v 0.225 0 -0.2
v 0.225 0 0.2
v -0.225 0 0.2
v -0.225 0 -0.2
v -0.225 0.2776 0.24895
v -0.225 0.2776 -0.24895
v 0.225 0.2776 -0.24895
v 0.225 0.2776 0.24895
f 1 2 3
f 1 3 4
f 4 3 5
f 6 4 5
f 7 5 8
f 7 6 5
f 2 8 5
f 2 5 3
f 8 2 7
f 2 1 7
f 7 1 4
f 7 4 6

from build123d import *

# Parameters (mm, degrees)
SKETCH_TL_CUTTING_R    = 0.997000038
TL_CUTTING_DEPTH       = 29.999999944
SKETCH_TDF_CUTTING_W   = 2.014000036
SKETCH_TDF_CUTTING_H   = 2.014000036
TDF_CUTTING_DEPTH      = 31.033115303
VW_VR_GRINDING_DEPTH   = 1.007000018
VW_VR_GRINDING_2_DEPTH = 1.007000018
ISA_GRINDING_DEPTH     = 1.007000018
SKETCH_PRE_FRX_BRX_W   = 0.762
SKETCH_PRE_FRX_BRX_H   = 0.990000052
SKETCH_PRE_FRX_BRX_W_2 = 0.79199994
PRE_FRX_BRX_DEPTH      = 1.007000018
FA_BA_GRINDING_DEPTH   = 1.007000018


with BuildPart() as part:
    # sketch_TL_cutting → TL_cutting (new body)
    with BuildSketch(Plane(origin=(0, 0, 0), x_dir=(1, 0, 0), z_dir=(0, 1, 0))):
        with Locations(Location((0, 0, 0), (0, 0, 270))):
            Circle(SKETCH_TL_CUTTING_R)
    extrude(amount=TL_CUTTING_DEPTH)

    # sketch_TDF_cutting → TDF_cutting (cut, through all)
    with BuildSketch(Plane(origin=(0, 0, 0), x_dir=(1, 0, 0), z_dir=(0, 1, 0))):
        with Locations((-1.610000082, 0)):
            Rectangle(SKETCH_TDF_CUTTING_W, SKETCH_TDF_CUTTING_H)
    extrude(amount=TDF_CUTTING_DEPTH, mode=Mode.SUBTRACT)


with BuildPart() as body_2:
    # sketch_VW_VR_grinding → VW_VR_grinding (new, symmetric)
    with BuildSketch(Plane(origin=(0, 0, 0), x_dir=(0, 0, -1), z_dir=(1, 0, 0))):
        with BuildLine():
            Line((-0.992000048, -0.00999998), (-0.992000048, 0.978888966))
            ThreePointArc((-0.992000048, 0.978888966), (-0.992048375, 0.979995844), (-0.99219299, 0.981094298))
            Line((-0.99219299, 0.981094298), (-1.016999998, 1.121781834))
            Line((-1.016999998, 1.121781834), (-1.007000018, -0.00999998))
            Line((-1.007000018, -0.00999998), (-0.992000048, -0.00999998))
        make_face()
    extrude(amount=VW_VR_GRINDING_DEPTH, both=True)


with BuildPart() as body_3:
    # sketch_VW_VR_grinding → VW_VR_grinding 2 (new, symmetric)
    with BuildSketch(Plane(origin=(0, 0, 0), x_dir=(0, 0, -1), z_dir=(1, 0, 0))):
        with BuildLine():
            Line((0.992000048, -0.00999998), (0.992000048, 0.978888966))
            ThreePointArc((0.992000048, 0.978888966), (0.992048375, 0.979995844), (0.99219299, 0.981094298))
            Line((0.99219299, 0.981094298), (1.016999998, 1.121781834))
            Line((1.016999998, 1.121781834), (1.007000018, -0.00999998))
            Line((1.007000018, -0.00999998), (0.992000048, -0.00999998))
        make_face()
    extrude(amount=VW_VR_GRINDING_2_DEPTH, both=True)


    add(body_2.part)  # ISA_grinding merges body 2
    # sketch_ISA_grinding → ISA_grinding (add, symmetric)
    with BuildSketch(Plane(origin=(0, 0, 0), x_dir=(0, 0, -1), z_dir=(1, 0, 0))):
        Polygon((-0.199999981, 0), (0.199999981, 0), (1.007000018, 4.576724638), (1.007000018, -0.02999994), (-1.007000018, -0.02999994), (-1.007000018, 4.576724638), align=None)
    extrude(amount=ISA_GRINDING_DEPTH, both=True)

    # sketch_pre_FRX_BRX → pre_FRX_BRX (add, symmetric)
    with BuildSketch(Plane.XY):
        with Locations((0.616000038, 0.485000046)):
            Rectangle(SKETCH_PRE_FRX_BRX_W, SKETCH_PRE_FRX_BRX_H)
        with Locations((-0.621000028, 0.485000046)):
            Rectangle(SKETCH_PRE_FRX_BRX_W_2, SKETCH_PRE_FRX_BRX_H)
    extrude(amount=PRE_FRX_BRX_DEPTH, both=True)

    # sketch_FA_BA_grinding → FA_BA_grinding (add, symmetric)
    with BuildSketch(Plane.XY):
        Polygon((0.225000058, -0.00999998), (0.225000058, 0.990000052), (1.124000038, 11.265616844), (1.124000038, -0.00999998), align=None)
        Polygon((-0.225000058, -0.00999998), (-0.225000058, 0.990000052), (-0.730000064, 6.762176533), (-0.730000064, -0.00999998), align=None)
    extrude(amount=FA_BA_GRINDING_DEPTH, both=True)


with BuildPart() as part_1:
    add(part.part)

    # B1_fix: cut body 3
    add(body_3.part, mode=Mode.SUBTRACT)

    # SurfaceCut1
    split(bisect_by=Plane(origin=(0, 0.277595628, 0), x_dir=(1, 0, 0), z_dir=(0, 1, 0)), keep=Keep.BOTTOM)


solid = part_1.part
